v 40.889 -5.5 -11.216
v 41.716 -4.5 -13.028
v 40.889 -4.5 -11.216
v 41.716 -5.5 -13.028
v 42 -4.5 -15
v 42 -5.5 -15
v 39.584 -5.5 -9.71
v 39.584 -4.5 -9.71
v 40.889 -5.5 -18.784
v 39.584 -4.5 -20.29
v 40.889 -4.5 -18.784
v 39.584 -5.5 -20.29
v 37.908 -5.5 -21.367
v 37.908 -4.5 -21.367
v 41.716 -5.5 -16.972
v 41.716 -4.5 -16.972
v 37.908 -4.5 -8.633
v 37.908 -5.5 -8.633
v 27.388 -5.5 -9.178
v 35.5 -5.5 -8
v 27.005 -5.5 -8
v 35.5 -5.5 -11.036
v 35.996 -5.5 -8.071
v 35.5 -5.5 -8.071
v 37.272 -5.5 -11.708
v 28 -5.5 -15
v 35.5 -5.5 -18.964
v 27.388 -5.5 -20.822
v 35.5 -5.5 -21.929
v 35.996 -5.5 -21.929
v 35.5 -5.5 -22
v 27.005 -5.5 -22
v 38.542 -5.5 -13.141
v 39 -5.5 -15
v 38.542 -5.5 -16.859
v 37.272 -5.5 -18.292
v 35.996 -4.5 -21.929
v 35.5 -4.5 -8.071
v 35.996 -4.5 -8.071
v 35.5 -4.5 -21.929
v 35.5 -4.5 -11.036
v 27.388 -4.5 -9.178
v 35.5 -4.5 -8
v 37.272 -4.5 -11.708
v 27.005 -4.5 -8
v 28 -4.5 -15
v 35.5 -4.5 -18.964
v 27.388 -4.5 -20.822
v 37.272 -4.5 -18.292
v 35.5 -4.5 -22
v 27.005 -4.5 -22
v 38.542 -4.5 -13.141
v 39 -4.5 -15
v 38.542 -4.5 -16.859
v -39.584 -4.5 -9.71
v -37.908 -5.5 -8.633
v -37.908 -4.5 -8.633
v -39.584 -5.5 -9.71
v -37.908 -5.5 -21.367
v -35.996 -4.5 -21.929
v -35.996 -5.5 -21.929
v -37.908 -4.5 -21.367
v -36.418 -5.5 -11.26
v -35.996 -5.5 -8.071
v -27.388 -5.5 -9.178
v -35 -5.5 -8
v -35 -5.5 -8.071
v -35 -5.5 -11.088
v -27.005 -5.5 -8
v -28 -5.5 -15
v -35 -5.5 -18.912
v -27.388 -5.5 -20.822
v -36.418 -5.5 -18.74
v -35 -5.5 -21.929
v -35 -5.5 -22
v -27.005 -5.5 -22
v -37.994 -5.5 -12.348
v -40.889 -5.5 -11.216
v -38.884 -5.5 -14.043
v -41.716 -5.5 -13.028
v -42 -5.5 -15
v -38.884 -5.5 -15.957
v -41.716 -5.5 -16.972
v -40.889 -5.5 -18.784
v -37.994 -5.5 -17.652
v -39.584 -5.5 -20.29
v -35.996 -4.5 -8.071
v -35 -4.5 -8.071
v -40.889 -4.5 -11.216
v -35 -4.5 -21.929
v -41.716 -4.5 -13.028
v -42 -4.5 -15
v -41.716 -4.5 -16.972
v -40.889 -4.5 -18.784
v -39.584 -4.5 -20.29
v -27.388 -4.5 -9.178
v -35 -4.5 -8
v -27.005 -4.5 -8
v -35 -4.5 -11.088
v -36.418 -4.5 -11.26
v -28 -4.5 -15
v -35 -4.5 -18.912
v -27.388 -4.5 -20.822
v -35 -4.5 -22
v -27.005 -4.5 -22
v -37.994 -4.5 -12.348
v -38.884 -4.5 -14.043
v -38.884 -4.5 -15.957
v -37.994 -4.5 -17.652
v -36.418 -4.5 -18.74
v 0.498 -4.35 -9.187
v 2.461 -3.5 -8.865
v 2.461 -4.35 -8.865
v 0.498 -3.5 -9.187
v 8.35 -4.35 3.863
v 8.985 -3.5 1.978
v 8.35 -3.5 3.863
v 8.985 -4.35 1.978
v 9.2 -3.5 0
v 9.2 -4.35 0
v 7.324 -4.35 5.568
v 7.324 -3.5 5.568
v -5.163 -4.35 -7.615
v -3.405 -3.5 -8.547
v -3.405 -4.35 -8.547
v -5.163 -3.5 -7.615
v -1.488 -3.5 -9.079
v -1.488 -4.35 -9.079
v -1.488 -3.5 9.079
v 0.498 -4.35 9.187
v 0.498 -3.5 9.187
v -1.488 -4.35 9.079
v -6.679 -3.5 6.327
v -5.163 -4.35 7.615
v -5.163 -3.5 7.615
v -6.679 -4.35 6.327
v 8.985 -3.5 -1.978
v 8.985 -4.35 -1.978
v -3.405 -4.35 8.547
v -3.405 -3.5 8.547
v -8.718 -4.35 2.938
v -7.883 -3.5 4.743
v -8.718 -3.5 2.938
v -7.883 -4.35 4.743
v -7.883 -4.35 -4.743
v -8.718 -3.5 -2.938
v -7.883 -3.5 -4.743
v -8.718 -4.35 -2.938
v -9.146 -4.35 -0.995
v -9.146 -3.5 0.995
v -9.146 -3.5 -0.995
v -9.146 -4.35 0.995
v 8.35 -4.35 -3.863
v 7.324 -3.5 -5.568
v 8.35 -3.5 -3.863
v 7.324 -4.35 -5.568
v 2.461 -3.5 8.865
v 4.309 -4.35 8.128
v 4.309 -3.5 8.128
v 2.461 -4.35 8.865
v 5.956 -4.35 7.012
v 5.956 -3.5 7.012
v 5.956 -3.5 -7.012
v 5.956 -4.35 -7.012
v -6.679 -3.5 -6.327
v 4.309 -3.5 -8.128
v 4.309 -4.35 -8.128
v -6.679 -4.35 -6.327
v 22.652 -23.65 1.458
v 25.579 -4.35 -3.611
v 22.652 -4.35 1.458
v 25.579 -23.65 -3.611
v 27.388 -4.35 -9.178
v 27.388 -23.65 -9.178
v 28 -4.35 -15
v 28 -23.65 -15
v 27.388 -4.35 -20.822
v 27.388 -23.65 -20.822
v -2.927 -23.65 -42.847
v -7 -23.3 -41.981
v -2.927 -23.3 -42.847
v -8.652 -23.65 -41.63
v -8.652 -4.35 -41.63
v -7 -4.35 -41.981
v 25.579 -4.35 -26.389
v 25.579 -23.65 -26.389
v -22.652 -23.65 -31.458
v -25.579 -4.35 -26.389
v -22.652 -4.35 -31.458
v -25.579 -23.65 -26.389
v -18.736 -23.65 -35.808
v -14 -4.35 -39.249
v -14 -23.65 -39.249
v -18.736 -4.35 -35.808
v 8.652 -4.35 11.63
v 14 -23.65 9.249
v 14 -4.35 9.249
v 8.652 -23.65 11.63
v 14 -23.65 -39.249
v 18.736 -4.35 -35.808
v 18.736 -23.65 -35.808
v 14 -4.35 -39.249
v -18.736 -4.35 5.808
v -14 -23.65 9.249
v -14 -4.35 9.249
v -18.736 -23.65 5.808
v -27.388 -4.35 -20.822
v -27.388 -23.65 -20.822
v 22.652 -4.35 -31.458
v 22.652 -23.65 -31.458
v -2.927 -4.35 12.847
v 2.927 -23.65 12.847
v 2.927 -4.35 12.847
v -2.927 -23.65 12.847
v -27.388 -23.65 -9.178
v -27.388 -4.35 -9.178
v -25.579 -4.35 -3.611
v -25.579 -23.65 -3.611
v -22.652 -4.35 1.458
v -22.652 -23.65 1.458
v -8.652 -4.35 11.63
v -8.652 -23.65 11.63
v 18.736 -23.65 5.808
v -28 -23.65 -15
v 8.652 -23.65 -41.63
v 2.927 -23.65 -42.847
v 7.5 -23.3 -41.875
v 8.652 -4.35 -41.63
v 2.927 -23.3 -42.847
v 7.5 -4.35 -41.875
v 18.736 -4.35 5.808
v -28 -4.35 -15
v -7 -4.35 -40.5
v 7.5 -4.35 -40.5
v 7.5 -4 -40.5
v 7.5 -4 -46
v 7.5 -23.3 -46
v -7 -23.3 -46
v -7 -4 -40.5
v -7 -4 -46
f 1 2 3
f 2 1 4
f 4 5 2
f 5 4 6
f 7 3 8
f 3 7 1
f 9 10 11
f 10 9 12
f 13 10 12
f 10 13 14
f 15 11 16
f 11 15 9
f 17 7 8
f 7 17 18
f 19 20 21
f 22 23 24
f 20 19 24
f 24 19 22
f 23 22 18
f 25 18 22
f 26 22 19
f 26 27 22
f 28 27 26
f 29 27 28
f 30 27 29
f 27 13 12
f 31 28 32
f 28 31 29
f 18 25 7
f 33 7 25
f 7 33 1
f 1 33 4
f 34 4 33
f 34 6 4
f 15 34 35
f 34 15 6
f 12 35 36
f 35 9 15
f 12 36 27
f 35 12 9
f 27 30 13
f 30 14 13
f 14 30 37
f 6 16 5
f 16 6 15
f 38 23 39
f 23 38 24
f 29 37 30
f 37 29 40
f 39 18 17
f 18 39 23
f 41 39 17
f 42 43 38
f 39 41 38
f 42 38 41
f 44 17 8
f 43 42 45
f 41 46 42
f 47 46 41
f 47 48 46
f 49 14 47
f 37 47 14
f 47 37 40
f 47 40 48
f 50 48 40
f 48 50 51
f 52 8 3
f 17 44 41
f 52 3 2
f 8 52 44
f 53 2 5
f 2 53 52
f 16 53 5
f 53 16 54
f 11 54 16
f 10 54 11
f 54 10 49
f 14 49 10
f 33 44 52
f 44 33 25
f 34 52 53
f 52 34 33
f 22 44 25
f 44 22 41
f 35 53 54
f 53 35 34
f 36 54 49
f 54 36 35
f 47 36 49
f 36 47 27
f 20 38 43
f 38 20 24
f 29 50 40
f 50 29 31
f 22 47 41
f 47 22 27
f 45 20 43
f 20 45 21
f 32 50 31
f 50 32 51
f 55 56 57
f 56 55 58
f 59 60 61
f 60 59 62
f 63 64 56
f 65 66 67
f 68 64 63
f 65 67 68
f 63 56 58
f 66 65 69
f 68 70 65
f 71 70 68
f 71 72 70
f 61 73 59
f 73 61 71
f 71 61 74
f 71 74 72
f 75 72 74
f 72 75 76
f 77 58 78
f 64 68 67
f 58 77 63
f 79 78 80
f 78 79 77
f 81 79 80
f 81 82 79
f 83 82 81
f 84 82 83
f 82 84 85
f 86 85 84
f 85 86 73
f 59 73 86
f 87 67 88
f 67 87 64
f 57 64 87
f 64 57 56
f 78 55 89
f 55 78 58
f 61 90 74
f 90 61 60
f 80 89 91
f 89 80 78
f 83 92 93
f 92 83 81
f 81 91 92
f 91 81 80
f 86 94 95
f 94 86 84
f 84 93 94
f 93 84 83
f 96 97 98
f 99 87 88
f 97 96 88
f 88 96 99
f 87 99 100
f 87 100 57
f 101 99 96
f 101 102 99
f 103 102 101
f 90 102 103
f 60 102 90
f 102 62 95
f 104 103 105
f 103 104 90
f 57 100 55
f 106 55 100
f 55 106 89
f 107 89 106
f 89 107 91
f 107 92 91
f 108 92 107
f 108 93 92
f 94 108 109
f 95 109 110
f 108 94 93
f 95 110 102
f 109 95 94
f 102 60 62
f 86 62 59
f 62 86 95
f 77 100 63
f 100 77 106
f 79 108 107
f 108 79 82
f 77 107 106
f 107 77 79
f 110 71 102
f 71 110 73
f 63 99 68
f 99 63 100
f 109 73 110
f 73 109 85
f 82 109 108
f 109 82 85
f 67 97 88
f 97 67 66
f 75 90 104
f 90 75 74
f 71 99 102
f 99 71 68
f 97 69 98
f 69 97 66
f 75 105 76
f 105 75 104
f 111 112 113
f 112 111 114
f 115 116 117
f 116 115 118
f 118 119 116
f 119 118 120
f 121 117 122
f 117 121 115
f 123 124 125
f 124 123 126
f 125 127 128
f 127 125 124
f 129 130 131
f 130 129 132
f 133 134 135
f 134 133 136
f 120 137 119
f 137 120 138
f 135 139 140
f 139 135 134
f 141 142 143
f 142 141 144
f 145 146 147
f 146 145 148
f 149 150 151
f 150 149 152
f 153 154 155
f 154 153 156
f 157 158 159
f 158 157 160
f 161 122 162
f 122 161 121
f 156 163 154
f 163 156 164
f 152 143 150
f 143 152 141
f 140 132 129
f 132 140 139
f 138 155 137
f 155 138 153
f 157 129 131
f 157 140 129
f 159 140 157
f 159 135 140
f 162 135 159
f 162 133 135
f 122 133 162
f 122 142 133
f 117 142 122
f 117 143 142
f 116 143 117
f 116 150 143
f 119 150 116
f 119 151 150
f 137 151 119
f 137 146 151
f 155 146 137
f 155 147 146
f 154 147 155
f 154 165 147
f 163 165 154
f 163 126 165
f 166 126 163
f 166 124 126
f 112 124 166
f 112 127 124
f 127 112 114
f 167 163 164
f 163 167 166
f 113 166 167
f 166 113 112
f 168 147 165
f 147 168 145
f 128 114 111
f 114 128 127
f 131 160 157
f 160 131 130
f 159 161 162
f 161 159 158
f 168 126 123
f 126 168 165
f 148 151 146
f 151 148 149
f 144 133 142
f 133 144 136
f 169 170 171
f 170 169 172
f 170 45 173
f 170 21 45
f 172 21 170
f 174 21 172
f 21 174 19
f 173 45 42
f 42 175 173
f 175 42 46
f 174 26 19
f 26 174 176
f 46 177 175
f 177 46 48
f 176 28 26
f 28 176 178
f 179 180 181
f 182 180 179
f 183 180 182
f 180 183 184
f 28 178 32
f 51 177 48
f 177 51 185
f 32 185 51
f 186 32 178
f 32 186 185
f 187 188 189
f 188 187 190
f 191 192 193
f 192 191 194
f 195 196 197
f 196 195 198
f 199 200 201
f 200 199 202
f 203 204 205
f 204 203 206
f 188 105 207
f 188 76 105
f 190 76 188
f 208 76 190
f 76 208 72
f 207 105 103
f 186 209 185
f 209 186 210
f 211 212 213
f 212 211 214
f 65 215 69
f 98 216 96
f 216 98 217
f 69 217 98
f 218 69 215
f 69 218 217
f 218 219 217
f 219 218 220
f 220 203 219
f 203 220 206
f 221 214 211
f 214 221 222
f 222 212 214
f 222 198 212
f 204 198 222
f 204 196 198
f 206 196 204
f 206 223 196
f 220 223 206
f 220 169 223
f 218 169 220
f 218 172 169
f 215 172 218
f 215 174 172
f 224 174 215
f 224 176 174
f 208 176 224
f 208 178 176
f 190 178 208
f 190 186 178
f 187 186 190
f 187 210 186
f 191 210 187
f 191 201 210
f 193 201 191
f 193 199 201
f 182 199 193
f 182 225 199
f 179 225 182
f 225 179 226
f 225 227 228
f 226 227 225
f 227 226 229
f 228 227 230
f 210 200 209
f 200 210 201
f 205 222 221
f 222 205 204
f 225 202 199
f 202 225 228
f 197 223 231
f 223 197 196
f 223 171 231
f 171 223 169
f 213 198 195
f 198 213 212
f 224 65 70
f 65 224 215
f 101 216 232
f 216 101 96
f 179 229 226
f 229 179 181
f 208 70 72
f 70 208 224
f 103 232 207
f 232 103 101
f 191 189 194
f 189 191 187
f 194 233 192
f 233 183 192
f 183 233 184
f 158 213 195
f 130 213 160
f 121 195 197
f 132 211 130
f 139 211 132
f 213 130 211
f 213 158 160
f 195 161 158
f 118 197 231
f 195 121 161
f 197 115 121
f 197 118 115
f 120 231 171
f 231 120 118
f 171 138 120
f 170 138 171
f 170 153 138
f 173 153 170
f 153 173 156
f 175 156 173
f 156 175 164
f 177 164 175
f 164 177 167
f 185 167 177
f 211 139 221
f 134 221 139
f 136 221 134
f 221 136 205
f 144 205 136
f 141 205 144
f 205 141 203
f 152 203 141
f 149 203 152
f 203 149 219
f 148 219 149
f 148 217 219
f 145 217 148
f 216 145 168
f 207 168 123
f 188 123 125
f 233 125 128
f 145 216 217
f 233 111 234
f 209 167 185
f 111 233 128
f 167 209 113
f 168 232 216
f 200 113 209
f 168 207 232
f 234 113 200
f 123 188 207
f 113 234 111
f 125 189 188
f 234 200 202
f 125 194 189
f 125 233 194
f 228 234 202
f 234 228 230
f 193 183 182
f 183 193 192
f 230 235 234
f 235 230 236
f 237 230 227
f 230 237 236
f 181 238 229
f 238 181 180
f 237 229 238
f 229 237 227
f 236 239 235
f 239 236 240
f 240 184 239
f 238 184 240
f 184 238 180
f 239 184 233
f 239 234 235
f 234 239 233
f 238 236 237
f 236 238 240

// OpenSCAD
module logo_motor(motor_rotation_x, motor_rotation_y, motor_rotation_z){
motor_shaft_r=5;
motor_shaft_h=8;
motor_flange_h = 1;
motor_flange_r = 9.20;
Motor_body_r = 28.00;
Motor_body_h = 19.30;

	///rotate object around to Y access
	rotate([motor_rotation_x, motor_rotation_y, motor_rotation_z]){
	
// shaft
		
			difference() {
		color("grey");
		cylinder(r=motor_shaft_r, h=motor_shaft_h, center=true);
			///add some flats
				
				translate([-5,2,-4])
				cube([10,5,6]);
				
				mirror([0,1,0]){
				
				translate([-5,2,-4])
				cube([10,5,6]);
				}
					}
	
					//flange
					translate([0,0,motor_shaft_h/2]) 
						color("yellow")
						cylinder(r=motor_flange_r, h=motor_flange_h, center=true);
						// Main Body
							translate([0,-15,14])
								color("silver")
						cylinder(r=Motor_body_r, h=Motor_body_h, center=true);
							//Flanges
								translate([35,-15,4.5]){
									difference() {
										cylinder(r=7, h=1);
											cylinder(r=4, h=1);
										}
										translate([-14,-7,0]){
											cube([14.5,14,1]);
										}
										//color("white")
										//cylinder(r=4, h=1);
									
								}
								translate([-35,-15,4.5]){
								difference() {
									cylinder(r=7, h=1);
									cylinder(r=4, h=1);
									}
									translate([0,-7,0]){
											cube([14.5,14,1]);
										}
											
										//color("white")
										//cylinder(r=4, h=1);
											
										}
							  //bottom
							color("blue")
							 translate([0-7,-46,4]) 
								  cube([14.5,5.5,Motor_body_h]);  
			
			}
}
logo_motor(90,0,0);
    
